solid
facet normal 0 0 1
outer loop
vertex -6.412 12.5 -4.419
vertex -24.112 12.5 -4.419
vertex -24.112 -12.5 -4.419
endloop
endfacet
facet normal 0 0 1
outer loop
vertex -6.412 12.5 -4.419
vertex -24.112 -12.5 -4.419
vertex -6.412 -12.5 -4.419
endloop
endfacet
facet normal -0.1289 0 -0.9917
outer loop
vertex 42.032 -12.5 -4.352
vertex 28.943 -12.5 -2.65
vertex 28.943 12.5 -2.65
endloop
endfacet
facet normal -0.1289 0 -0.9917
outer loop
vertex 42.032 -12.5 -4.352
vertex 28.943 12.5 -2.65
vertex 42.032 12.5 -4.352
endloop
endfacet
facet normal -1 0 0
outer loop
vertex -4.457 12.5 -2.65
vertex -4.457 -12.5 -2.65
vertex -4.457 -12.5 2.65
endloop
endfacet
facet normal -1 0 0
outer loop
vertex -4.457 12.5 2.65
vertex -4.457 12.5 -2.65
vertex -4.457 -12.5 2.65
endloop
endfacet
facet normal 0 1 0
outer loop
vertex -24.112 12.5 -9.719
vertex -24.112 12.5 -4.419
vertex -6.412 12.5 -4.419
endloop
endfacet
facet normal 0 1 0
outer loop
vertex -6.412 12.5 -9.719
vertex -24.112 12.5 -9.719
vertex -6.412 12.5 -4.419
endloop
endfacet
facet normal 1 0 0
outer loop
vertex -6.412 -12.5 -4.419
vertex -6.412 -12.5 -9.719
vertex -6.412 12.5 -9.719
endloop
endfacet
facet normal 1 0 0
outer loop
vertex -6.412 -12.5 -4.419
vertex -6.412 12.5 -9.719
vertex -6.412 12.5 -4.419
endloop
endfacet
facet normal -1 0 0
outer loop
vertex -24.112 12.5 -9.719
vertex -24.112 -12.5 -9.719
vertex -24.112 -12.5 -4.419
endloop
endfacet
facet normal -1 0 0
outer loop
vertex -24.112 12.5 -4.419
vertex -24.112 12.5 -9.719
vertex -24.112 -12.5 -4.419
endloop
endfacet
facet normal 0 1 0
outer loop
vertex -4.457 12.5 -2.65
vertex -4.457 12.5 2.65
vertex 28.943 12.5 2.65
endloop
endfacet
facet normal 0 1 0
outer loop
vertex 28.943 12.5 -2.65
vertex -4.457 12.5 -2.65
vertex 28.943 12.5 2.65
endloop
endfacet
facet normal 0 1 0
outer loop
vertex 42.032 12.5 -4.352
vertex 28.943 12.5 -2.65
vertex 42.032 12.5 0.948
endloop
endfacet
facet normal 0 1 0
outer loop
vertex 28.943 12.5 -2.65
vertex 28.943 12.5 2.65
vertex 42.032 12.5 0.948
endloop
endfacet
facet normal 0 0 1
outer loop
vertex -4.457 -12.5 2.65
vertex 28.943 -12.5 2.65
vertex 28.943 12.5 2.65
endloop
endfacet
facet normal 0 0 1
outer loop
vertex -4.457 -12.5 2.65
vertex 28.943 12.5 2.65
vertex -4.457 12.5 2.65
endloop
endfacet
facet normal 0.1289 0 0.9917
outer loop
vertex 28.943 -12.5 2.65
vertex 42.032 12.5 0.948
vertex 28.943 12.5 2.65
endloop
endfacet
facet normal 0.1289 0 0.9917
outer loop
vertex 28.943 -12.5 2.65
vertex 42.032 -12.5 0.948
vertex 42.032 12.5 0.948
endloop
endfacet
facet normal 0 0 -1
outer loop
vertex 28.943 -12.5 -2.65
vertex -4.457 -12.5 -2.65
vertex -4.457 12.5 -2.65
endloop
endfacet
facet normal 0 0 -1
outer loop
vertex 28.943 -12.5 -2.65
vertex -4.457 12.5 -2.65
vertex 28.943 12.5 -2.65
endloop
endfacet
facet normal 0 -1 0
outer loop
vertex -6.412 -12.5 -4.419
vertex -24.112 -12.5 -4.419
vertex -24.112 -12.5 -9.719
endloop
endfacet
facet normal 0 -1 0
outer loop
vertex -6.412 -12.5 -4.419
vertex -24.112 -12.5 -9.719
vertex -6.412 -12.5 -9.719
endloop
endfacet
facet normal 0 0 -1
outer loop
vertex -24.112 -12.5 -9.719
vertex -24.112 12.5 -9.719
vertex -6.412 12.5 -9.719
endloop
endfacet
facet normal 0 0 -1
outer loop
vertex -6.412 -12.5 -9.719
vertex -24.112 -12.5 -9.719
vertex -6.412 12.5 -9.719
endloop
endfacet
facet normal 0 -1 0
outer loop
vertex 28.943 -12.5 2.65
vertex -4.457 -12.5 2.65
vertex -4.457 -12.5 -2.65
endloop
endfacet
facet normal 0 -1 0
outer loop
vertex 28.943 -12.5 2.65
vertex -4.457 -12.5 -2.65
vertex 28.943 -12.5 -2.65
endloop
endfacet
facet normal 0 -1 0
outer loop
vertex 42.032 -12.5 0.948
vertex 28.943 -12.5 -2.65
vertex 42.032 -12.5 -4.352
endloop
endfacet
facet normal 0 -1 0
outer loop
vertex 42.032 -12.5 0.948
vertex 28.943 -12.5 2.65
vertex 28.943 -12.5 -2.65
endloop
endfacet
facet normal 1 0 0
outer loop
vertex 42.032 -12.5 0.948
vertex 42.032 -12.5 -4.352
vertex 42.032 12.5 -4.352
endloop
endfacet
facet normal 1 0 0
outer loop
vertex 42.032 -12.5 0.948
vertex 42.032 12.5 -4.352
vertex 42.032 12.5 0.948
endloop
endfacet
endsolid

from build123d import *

# Parameters (mm, degrees)
F0_W     = 17.7
F0_H     = 5.3
F1_DEPTH = 12.5
F0_W_2   = 9.1
F0_W_3   = 24.3
F2_DEPTH = 12.5
F3_DEPTH = 12.5


with BuildPart() as f1:
    # F0 (on Front) → F1 (new body, symmetric)
    with BuildSketch(Plane.XZ):
        with Locations((-15.26235, -7.068884)):
            Rectangle(F0_W, F0_H)
    extrude(amount=F1_DEPTH, both=True)


with BuildPart() as f2:
    # F0 (on Front) → F2 (new body, symmetric)
    with BuildSketch(Plane.XZ):
        with Locations((0.092667, 0)):
            Rectangle(F0_W_2, F0_H)
        with Locations((16.792667, 0)):
            Rectangle(F0_W_3, F0_H)
    extrude(amount=F2_DEPTH, both=True)

    # F0 (on Front) → F3 (join, symmetric)
    with BuildSketch(Plane.XZ):
        with Locations((16.792667, 0)):
            Rectangle(F0_W_3, F0_H)
        Polygon((28.942667, 2.65), (28.942667, -2.65), (42.032429, -4.352393), (42.032429, -1.352393), (42.032429, 0.947607), align=None)
    extrude(amount=F3_DEPTH, both=True)


solid = Compound([f1.part, f2.part])
